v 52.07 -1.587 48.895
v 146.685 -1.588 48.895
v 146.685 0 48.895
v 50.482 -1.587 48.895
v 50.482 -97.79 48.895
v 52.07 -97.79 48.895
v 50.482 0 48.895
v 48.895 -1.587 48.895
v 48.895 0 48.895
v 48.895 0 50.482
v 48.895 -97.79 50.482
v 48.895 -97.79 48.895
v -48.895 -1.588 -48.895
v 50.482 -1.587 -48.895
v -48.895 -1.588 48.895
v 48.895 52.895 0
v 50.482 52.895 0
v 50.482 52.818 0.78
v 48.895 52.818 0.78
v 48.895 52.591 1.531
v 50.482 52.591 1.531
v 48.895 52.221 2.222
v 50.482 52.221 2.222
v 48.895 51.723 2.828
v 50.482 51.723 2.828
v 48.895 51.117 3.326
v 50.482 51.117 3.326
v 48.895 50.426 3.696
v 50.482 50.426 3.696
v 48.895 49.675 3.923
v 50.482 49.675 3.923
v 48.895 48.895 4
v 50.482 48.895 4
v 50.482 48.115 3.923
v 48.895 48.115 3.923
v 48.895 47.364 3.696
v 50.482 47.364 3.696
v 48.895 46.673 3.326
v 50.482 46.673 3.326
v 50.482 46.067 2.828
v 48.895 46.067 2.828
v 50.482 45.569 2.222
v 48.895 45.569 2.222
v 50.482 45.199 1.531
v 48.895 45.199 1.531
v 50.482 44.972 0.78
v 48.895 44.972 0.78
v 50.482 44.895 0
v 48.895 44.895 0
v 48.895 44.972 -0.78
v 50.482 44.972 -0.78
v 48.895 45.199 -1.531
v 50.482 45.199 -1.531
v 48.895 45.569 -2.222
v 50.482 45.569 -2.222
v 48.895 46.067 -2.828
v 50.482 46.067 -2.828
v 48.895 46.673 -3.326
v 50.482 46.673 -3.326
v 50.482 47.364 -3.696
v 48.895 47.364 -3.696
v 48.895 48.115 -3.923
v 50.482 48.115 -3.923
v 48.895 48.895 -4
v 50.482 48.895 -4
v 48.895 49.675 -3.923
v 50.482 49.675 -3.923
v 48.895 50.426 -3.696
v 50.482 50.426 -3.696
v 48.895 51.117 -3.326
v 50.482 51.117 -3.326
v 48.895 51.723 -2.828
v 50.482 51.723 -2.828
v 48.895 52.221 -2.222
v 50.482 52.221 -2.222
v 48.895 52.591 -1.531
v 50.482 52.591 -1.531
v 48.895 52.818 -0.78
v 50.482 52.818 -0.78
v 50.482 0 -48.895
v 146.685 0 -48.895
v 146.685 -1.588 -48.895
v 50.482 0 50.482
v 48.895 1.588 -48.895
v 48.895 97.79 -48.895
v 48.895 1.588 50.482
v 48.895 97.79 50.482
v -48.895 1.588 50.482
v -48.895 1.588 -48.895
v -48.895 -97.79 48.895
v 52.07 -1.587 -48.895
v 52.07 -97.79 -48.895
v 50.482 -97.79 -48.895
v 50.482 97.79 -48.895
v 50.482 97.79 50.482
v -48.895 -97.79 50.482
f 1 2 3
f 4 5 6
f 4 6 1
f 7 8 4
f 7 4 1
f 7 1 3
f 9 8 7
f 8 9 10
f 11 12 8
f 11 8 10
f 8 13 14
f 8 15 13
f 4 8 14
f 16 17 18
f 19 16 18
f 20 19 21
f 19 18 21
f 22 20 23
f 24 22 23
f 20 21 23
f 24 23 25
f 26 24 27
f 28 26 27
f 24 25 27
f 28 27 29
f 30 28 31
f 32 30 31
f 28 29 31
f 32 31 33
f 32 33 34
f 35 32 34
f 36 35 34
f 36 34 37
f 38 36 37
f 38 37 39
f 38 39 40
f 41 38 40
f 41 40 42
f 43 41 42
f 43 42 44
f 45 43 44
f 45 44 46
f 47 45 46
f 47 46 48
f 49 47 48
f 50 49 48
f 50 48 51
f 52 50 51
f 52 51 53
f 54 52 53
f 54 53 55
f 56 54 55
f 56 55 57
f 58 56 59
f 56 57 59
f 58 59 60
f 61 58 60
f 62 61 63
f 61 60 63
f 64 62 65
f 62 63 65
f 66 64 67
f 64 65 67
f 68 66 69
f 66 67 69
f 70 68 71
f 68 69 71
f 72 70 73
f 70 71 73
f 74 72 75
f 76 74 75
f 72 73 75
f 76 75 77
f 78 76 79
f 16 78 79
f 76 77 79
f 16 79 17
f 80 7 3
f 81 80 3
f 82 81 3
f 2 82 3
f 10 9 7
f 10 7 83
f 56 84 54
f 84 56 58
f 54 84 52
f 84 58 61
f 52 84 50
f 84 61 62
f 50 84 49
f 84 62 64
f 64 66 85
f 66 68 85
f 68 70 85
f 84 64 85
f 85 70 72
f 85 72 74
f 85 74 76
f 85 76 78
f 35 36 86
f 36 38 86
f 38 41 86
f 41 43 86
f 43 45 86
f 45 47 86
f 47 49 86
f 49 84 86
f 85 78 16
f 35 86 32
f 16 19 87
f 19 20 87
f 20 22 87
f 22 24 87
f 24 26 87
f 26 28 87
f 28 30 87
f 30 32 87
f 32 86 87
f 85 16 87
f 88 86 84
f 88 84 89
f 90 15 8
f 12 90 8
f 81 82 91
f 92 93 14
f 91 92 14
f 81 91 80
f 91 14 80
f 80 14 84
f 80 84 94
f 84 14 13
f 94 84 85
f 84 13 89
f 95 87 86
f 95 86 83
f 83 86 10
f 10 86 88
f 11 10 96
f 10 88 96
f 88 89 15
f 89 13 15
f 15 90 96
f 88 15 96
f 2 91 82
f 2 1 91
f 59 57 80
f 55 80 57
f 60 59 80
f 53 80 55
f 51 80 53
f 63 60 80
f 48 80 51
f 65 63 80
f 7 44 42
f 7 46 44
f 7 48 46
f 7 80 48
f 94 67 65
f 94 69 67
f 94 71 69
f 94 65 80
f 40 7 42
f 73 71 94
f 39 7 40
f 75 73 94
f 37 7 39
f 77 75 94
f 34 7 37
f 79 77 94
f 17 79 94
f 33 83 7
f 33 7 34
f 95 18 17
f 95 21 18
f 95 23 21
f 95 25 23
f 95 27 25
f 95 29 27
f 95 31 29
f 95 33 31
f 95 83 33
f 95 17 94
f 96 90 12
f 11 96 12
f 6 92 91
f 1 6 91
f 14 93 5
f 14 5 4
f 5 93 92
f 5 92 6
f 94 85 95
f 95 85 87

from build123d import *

# Parameters (mm, degrees)
F0_W      = 97.79
F0_H      = 97.79
F1_DEPTH  = 1.5875
F2_W      = 97.79
F2_H      = 96.2025
F2_H_2    = 1.5875
F3_DEPTH  = 1.5875
F4_W      = 97.79
F4_H      = 99.3775
F5_DEPTH  = 1.5875
F6_W      = 96.2025
F6_H      = 99.3775
F6_W_2    = 1.5875
F7_DEPTH  = 1.5875
F8_R      = 4
F9_DEPTH  = 25.4
F10_W     = 96.2025
F10_H     = 97.79
F10_W_2   = 1.5875
F11_DEPTH = 1.5875
F12_W     = 97.79
F12_H     = 97.79
F13_DEPTH = 1.5875


with BuildPart() as f1:
    # F0 (on Front) → F1 (new body)
    with BuildSketch(Plane.XZ):
        Rectangle(F0_W, F0_H)
    extrude(amount=F1_DEPTH)

    # F2 (on face) → F3 (join)
    with BuildSketch(Plane.XY.offset(48.895)):
        with Locations((0, -49.68875)):
            Rectangle(F2_W, F2_H)
        with Locations((0, -0.79375)):
            Rectangle(F2_W, F2_H_2)
    extrude(amount=F3_DEPTH)

    # F4 (on face) → F5 (join)
    with BuildSketch(Plane(origin=(0, 0, 0), x_dir=(-1, 0, 0), z_dir=(0, 1, 0))):
        with Locations((0, 0.79375)):
            Rectangle(F4_W, F4_H)
    extrude(amount=F5_DEPTH)

    # F6 (on face) → F7 (join)
    with BuildSketch(Plane.YZ.offset(48.895)):
        with Locations((49.68875, 0.79375)):
            Rectangle(F6_W, F6_H)
        with Locations((0.79375, 0.79375)):
            Rectangle(F6_W_2, F6_H)
    extrude(amount=F7_DEPTH)

    # F8 (on face) → F9 (cut)
    with BuildSketch(Plane.YZ.offset(50.4825)):
        with Locations((48.895, 0)):
            Circle(F8_R)
    extrude(amount=-F9_DEPTH, mode=Mode.SUBTRACT)

    # F10 (on face) → F11 (join)
    with BuildSketch(Plane.XZ):
        with Locations((98.58375, 0)):
            Rectangle(F10_W, F10_H)
        with Locations((49.68875, 0)):
            Rectangle(F10_W_2, F10_H)
    extrude(amount=F11_DEPTH)

    # F12 (on face) → F13 (join)
    with BuildSketch(Plane.YZ.offset(50.4825)):
        with Locations((-48.895, 0)):
            Rectangle(F12_W, F12_H)
    extrude(amount=F13_DEPTH)


solid = f1.part
